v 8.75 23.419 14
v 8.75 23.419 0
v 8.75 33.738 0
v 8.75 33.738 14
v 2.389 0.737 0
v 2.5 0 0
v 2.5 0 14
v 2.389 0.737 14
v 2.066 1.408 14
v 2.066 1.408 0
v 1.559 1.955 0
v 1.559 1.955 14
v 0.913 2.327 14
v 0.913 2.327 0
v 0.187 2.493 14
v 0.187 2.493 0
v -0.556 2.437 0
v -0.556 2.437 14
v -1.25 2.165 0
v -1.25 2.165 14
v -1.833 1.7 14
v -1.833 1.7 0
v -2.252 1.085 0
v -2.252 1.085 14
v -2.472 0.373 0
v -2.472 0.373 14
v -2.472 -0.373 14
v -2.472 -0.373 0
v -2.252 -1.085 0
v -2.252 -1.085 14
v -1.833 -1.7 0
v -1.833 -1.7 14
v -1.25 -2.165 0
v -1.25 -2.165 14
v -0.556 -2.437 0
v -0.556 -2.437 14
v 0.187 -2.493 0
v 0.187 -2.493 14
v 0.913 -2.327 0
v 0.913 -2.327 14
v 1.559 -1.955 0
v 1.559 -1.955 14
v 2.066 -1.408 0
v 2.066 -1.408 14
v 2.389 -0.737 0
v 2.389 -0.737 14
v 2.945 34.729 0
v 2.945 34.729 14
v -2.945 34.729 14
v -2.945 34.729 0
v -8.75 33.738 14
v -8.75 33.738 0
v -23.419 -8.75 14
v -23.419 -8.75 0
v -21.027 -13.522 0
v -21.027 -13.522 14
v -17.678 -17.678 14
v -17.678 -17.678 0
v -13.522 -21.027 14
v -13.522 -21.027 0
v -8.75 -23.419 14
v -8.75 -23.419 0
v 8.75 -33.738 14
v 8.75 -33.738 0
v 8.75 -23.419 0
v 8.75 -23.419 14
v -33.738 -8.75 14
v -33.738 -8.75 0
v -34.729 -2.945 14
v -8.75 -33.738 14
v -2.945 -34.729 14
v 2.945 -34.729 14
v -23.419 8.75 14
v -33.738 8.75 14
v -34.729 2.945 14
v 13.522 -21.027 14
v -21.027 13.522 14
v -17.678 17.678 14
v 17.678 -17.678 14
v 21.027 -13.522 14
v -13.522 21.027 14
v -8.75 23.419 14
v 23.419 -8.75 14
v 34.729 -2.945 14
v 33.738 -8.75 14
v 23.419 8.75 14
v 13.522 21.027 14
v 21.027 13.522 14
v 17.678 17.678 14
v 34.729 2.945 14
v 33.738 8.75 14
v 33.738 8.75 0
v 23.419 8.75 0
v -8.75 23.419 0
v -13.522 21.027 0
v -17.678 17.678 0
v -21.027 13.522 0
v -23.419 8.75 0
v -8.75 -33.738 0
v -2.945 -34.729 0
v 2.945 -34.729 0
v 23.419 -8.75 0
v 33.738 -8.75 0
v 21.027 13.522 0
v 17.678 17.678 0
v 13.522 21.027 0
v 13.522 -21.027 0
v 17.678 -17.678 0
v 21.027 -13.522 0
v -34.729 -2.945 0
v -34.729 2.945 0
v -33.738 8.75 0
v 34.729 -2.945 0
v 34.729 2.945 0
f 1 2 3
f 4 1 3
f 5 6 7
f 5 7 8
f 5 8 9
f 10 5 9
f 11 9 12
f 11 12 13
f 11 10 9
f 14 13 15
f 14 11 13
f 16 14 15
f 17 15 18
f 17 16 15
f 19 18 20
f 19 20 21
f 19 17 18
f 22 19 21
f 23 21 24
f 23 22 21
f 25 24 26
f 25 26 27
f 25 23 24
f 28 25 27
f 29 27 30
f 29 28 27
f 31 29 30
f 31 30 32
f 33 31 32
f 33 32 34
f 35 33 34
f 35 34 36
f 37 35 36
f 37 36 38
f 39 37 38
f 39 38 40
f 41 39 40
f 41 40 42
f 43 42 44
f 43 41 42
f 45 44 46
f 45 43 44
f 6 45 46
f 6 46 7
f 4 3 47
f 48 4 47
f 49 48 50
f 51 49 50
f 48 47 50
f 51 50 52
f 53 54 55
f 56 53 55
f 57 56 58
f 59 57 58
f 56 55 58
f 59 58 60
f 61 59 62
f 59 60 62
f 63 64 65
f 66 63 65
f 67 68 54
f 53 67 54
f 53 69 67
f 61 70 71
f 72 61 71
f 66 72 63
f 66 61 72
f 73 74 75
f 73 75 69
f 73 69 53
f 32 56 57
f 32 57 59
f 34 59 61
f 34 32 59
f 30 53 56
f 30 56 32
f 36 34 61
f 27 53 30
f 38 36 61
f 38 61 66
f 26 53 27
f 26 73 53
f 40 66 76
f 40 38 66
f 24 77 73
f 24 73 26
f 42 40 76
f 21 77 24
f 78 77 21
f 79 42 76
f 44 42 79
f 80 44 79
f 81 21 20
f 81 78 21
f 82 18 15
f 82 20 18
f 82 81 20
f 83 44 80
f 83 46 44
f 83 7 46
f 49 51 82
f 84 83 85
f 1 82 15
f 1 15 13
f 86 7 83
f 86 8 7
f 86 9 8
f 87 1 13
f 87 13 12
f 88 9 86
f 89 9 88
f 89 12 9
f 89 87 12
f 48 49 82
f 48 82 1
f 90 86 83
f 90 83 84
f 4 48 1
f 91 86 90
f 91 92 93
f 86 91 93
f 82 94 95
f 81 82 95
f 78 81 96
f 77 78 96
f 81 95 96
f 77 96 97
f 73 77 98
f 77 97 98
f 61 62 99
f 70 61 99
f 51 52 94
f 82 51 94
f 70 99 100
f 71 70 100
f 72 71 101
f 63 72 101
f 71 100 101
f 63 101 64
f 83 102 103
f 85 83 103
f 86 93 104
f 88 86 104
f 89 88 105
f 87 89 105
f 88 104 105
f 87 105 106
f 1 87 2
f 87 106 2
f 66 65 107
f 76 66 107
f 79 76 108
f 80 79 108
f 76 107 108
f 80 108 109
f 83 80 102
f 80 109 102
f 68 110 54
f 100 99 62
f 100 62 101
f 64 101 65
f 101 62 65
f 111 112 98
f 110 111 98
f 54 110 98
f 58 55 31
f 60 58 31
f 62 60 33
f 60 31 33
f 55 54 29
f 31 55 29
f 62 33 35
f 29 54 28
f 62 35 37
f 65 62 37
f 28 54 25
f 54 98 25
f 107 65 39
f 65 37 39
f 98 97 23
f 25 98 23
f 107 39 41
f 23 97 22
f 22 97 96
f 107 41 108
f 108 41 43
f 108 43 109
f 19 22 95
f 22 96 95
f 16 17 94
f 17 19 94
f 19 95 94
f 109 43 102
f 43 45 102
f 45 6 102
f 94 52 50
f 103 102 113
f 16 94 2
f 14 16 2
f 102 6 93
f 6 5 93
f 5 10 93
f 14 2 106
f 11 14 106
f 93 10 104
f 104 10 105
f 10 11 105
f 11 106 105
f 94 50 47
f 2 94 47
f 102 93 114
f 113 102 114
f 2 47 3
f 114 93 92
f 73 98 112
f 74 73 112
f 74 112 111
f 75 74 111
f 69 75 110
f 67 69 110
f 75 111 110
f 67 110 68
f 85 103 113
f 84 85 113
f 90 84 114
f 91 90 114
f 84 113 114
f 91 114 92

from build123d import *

# Parameters (mm, degrees)
ROTOR_SKETCH_R = 2.5
ROTOR_DEPTH    = 14


with BuildPart() as part:
    # Rotor_Sketch → Rotor (new body)
    with BuildSketch(Plane.XY):
        with BuildLine():
            Line((-8.75, 33.737818734), (-8.75, 23.418742494))
            ThreePointArc((-8.75, 23.418742494), (-17.67766953, 17.67766953), (-23.418742494, 8.75))
            Line((-23.418742494, 8.75), (-33.737818734, 8.75))
            ThreePointArc((-33.737818734, 8.75), (-34.854022909, 0), (-33.737818734, -8.75))
            Line((-33.737818734, -8.75), (-23.418742494, -8.75))
            ThreePointArc((-23.418742494, -8.75), (-17.67766953, -17.67766953), (-8.75, -23.418742494))
            Line((-8.75, -23.418742494), (-8.75, -33.737818734))
            ThreePointArc((-8.75, -33.737818734), (0, -34.854022909), (8.75, -33.737818734))
            Line((8.75, -33.737818734), (8.75, -23.418742494))
            ThreePointArc((8.75, -23.418742494), (17.67766953, -17.67766953), (23.418742494, -8.75))
            Line((23.418742494, -8.75), (33.737818734, -8.75))
            ThreePointArc((33.737818734, -8.75), (34.854022909, 0), (33.737818734, 8.75))
            Line((33.737818734, 8.75), (23.418742494, 8.75))
            ThreePointArc((23.418742494, 8.75), (17.67766953, 17.67766953), (8.75, 23.418742494))
            Line((8.75, 23.418742494), (8.75, 33.737818734))
            ThreePointArc((8.75, 33.737818734), (0, 34.854022909), (-8.75, 33.737818734))
        make_face()
        Circle(ROTOR_SKETCH_R, mode=Mode.SUBTRACT)
    extrude(amount=ROTOR_DEPTH)


solid = part.part
